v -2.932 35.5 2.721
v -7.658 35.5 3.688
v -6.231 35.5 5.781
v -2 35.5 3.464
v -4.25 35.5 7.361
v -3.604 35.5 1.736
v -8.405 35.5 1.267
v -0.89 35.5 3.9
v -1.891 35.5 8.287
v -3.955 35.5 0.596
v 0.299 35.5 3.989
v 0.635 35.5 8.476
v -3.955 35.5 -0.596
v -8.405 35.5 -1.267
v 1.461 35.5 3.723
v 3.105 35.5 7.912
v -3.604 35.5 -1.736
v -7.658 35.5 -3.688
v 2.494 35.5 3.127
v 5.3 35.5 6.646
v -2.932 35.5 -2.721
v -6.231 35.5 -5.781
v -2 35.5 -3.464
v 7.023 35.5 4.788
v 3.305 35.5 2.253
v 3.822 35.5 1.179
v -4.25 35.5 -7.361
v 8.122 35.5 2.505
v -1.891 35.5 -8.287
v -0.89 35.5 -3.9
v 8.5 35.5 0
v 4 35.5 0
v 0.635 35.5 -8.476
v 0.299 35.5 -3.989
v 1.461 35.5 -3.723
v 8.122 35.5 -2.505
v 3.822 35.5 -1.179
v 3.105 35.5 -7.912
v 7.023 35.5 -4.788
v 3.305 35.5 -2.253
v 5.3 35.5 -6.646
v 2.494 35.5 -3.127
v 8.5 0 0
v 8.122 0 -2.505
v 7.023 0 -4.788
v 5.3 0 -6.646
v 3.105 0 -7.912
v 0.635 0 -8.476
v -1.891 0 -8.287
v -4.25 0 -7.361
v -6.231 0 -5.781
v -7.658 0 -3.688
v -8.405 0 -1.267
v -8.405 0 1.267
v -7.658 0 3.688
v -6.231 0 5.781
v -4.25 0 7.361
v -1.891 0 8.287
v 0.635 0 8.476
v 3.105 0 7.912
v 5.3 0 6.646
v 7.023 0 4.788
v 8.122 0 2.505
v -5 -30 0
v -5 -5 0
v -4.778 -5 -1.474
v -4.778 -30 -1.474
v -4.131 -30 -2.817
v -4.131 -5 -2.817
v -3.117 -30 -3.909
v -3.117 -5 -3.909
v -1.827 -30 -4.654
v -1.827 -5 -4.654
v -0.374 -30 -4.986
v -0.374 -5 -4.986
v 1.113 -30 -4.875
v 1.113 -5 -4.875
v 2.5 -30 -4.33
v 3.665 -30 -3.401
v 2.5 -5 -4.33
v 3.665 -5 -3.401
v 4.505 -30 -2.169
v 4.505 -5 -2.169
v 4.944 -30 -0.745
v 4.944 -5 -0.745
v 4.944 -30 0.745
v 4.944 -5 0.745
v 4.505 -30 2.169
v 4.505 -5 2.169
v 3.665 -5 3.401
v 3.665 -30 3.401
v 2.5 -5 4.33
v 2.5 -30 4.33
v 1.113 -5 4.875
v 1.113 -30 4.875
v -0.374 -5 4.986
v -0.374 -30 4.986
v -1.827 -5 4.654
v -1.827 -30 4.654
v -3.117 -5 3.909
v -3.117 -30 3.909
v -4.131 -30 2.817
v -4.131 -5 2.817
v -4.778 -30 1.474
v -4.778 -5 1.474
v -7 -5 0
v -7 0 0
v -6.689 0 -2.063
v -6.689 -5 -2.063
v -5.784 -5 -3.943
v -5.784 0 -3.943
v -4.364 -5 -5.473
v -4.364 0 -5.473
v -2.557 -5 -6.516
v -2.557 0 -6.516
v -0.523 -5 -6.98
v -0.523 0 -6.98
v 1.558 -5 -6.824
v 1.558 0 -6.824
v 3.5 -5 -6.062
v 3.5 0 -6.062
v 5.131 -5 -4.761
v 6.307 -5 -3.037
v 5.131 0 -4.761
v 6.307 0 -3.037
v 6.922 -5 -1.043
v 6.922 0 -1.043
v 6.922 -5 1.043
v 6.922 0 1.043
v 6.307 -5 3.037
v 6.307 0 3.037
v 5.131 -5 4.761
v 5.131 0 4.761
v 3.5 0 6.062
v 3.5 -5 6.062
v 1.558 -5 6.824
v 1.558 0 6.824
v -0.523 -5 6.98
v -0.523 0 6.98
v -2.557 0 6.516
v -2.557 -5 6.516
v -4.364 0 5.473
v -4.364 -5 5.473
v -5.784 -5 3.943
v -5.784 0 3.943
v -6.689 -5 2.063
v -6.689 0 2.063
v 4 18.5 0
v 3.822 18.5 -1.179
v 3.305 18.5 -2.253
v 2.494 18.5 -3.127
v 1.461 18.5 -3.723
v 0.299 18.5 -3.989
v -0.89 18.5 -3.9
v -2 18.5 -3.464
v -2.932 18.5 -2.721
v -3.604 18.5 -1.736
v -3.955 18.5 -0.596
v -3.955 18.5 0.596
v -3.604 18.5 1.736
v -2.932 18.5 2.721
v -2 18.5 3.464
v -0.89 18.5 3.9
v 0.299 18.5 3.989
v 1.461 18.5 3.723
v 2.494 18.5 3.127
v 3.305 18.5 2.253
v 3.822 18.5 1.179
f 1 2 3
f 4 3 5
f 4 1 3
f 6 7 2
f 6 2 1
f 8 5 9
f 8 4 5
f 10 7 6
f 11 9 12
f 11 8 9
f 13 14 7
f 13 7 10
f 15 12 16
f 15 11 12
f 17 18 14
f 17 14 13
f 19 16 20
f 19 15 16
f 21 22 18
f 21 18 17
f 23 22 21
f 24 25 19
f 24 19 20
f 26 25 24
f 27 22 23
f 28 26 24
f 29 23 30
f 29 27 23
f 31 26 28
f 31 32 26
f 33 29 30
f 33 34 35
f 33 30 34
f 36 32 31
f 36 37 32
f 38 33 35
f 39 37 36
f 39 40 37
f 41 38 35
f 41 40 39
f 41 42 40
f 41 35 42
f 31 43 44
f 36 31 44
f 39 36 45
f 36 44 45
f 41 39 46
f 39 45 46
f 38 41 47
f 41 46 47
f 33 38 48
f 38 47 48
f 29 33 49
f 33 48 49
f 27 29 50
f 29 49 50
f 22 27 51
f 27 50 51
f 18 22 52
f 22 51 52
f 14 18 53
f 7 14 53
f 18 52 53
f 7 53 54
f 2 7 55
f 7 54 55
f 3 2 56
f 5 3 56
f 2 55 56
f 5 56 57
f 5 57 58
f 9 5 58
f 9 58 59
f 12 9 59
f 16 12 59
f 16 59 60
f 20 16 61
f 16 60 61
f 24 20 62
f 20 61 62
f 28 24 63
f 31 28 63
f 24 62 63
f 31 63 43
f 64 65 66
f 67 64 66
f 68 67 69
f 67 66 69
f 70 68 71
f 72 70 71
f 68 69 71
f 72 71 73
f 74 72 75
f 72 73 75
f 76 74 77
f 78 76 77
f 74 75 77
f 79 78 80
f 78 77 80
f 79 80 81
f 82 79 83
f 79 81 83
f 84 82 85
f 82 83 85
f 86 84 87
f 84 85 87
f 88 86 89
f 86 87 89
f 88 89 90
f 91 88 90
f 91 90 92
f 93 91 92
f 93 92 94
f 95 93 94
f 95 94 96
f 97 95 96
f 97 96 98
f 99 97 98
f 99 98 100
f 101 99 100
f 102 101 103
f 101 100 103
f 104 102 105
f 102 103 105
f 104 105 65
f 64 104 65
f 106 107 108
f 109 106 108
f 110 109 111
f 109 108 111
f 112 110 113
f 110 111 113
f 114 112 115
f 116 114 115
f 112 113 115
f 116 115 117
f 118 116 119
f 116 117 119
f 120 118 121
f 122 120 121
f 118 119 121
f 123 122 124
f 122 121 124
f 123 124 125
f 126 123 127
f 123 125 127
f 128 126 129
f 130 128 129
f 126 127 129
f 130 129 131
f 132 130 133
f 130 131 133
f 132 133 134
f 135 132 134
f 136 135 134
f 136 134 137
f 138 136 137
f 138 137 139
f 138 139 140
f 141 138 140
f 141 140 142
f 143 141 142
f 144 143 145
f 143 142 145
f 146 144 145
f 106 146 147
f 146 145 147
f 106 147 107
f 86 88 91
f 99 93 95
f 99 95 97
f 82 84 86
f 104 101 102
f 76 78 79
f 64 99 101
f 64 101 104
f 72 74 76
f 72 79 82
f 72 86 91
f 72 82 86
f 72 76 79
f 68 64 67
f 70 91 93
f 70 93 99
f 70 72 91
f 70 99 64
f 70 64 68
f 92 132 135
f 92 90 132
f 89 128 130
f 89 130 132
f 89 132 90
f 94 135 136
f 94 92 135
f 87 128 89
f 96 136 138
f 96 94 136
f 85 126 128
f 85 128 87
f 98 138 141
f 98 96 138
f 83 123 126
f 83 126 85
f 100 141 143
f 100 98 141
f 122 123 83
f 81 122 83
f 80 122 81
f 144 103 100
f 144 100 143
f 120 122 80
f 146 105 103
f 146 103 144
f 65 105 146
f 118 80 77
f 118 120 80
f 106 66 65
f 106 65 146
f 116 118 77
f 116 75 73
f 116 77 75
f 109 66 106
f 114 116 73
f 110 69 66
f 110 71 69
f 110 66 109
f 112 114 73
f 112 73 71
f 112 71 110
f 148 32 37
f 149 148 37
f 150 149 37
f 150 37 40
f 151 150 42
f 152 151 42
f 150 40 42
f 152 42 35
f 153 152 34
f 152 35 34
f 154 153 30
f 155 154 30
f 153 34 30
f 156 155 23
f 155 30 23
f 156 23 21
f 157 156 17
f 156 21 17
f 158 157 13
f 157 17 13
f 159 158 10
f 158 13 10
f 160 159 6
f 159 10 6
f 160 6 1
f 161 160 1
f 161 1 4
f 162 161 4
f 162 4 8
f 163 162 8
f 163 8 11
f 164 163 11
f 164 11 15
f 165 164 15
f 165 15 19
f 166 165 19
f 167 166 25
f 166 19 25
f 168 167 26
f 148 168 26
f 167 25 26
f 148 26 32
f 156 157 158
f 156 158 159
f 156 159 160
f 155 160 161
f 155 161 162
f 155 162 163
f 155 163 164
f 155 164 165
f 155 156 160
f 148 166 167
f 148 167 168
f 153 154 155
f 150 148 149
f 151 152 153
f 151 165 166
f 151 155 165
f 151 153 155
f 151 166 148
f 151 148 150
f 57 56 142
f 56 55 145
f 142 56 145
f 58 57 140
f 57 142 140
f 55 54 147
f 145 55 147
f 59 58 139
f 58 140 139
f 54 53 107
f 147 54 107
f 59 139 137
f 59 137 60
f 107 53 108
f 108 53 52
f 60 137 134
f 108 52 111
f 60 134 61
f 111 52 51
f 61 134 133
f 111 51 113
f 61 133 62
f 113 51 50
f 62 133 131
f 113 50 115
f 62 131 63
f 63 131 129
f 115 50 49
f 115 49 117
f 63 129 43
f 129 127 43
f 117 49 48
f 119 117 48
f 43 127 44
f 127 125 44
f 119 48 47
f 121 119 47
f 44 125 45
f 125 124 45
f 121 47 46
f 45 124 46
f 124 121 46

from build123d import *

# Parameters (mm, degrees)
SKETCH1_R           = 8.5
BOSS_EXTRUDE1_DEPTH = 35.5
SKETCH3_R           = 7
BOSS_EXTRUDE2_DEPTH = 5
SKETCH5_R           = 5
BOSS_EXTRUDE3_DEPTH = 25
SKETCH2_R           = 4
CUT_EXTRUDE1_DEPTH  = 17


with BuildPart() as part:
    # Sketch1 → Boss-Extrude1 (new body)
    with BuildSketch(Plane(origin=(0, 0, 0), x_dir=(1, 0, 0), z_dir=(0, 1, 0))):
        Circle(SKETCH1_R)
    extrude(amount=BOSS_EXTRUDE1_DEPTH)

    # Sketch3 → Boss-Extrude2 (add)
    with BuildSketch(Plane(origin=(0, 0, 0), x_dir=(-1, 0, 0), z_dir=(0, -1, 0))):
        Circle(SKETCH3_R)
    extrude(amount=BOSS_EXTRUDE2_DEPTH)

    # Sketch5 → Boss-Extrude3 (add)
    with BuildSketch(Plane(origin=(0, -5, 0), x_dir=(-1, 0, 0), z_dir=(0, -1, 0))):
        Circle(SKETCH5_R)
    extrude(amount=BOSS_EXTRUDE3_DEPTH)

    # Sketch2 → Cut-Extrude1 (cut)
    with BuildSketch(Plane(origin=(0, 35.5, 0), x_dir=(1, 0, 0), z_dir=(0, 1, 0))):
        Circle(SKETCH2_R)
    extrude(amount=-CUT_EXTRUDE1_DEPTH, mode=Mode.SUBTRACT)


solid = part.part
